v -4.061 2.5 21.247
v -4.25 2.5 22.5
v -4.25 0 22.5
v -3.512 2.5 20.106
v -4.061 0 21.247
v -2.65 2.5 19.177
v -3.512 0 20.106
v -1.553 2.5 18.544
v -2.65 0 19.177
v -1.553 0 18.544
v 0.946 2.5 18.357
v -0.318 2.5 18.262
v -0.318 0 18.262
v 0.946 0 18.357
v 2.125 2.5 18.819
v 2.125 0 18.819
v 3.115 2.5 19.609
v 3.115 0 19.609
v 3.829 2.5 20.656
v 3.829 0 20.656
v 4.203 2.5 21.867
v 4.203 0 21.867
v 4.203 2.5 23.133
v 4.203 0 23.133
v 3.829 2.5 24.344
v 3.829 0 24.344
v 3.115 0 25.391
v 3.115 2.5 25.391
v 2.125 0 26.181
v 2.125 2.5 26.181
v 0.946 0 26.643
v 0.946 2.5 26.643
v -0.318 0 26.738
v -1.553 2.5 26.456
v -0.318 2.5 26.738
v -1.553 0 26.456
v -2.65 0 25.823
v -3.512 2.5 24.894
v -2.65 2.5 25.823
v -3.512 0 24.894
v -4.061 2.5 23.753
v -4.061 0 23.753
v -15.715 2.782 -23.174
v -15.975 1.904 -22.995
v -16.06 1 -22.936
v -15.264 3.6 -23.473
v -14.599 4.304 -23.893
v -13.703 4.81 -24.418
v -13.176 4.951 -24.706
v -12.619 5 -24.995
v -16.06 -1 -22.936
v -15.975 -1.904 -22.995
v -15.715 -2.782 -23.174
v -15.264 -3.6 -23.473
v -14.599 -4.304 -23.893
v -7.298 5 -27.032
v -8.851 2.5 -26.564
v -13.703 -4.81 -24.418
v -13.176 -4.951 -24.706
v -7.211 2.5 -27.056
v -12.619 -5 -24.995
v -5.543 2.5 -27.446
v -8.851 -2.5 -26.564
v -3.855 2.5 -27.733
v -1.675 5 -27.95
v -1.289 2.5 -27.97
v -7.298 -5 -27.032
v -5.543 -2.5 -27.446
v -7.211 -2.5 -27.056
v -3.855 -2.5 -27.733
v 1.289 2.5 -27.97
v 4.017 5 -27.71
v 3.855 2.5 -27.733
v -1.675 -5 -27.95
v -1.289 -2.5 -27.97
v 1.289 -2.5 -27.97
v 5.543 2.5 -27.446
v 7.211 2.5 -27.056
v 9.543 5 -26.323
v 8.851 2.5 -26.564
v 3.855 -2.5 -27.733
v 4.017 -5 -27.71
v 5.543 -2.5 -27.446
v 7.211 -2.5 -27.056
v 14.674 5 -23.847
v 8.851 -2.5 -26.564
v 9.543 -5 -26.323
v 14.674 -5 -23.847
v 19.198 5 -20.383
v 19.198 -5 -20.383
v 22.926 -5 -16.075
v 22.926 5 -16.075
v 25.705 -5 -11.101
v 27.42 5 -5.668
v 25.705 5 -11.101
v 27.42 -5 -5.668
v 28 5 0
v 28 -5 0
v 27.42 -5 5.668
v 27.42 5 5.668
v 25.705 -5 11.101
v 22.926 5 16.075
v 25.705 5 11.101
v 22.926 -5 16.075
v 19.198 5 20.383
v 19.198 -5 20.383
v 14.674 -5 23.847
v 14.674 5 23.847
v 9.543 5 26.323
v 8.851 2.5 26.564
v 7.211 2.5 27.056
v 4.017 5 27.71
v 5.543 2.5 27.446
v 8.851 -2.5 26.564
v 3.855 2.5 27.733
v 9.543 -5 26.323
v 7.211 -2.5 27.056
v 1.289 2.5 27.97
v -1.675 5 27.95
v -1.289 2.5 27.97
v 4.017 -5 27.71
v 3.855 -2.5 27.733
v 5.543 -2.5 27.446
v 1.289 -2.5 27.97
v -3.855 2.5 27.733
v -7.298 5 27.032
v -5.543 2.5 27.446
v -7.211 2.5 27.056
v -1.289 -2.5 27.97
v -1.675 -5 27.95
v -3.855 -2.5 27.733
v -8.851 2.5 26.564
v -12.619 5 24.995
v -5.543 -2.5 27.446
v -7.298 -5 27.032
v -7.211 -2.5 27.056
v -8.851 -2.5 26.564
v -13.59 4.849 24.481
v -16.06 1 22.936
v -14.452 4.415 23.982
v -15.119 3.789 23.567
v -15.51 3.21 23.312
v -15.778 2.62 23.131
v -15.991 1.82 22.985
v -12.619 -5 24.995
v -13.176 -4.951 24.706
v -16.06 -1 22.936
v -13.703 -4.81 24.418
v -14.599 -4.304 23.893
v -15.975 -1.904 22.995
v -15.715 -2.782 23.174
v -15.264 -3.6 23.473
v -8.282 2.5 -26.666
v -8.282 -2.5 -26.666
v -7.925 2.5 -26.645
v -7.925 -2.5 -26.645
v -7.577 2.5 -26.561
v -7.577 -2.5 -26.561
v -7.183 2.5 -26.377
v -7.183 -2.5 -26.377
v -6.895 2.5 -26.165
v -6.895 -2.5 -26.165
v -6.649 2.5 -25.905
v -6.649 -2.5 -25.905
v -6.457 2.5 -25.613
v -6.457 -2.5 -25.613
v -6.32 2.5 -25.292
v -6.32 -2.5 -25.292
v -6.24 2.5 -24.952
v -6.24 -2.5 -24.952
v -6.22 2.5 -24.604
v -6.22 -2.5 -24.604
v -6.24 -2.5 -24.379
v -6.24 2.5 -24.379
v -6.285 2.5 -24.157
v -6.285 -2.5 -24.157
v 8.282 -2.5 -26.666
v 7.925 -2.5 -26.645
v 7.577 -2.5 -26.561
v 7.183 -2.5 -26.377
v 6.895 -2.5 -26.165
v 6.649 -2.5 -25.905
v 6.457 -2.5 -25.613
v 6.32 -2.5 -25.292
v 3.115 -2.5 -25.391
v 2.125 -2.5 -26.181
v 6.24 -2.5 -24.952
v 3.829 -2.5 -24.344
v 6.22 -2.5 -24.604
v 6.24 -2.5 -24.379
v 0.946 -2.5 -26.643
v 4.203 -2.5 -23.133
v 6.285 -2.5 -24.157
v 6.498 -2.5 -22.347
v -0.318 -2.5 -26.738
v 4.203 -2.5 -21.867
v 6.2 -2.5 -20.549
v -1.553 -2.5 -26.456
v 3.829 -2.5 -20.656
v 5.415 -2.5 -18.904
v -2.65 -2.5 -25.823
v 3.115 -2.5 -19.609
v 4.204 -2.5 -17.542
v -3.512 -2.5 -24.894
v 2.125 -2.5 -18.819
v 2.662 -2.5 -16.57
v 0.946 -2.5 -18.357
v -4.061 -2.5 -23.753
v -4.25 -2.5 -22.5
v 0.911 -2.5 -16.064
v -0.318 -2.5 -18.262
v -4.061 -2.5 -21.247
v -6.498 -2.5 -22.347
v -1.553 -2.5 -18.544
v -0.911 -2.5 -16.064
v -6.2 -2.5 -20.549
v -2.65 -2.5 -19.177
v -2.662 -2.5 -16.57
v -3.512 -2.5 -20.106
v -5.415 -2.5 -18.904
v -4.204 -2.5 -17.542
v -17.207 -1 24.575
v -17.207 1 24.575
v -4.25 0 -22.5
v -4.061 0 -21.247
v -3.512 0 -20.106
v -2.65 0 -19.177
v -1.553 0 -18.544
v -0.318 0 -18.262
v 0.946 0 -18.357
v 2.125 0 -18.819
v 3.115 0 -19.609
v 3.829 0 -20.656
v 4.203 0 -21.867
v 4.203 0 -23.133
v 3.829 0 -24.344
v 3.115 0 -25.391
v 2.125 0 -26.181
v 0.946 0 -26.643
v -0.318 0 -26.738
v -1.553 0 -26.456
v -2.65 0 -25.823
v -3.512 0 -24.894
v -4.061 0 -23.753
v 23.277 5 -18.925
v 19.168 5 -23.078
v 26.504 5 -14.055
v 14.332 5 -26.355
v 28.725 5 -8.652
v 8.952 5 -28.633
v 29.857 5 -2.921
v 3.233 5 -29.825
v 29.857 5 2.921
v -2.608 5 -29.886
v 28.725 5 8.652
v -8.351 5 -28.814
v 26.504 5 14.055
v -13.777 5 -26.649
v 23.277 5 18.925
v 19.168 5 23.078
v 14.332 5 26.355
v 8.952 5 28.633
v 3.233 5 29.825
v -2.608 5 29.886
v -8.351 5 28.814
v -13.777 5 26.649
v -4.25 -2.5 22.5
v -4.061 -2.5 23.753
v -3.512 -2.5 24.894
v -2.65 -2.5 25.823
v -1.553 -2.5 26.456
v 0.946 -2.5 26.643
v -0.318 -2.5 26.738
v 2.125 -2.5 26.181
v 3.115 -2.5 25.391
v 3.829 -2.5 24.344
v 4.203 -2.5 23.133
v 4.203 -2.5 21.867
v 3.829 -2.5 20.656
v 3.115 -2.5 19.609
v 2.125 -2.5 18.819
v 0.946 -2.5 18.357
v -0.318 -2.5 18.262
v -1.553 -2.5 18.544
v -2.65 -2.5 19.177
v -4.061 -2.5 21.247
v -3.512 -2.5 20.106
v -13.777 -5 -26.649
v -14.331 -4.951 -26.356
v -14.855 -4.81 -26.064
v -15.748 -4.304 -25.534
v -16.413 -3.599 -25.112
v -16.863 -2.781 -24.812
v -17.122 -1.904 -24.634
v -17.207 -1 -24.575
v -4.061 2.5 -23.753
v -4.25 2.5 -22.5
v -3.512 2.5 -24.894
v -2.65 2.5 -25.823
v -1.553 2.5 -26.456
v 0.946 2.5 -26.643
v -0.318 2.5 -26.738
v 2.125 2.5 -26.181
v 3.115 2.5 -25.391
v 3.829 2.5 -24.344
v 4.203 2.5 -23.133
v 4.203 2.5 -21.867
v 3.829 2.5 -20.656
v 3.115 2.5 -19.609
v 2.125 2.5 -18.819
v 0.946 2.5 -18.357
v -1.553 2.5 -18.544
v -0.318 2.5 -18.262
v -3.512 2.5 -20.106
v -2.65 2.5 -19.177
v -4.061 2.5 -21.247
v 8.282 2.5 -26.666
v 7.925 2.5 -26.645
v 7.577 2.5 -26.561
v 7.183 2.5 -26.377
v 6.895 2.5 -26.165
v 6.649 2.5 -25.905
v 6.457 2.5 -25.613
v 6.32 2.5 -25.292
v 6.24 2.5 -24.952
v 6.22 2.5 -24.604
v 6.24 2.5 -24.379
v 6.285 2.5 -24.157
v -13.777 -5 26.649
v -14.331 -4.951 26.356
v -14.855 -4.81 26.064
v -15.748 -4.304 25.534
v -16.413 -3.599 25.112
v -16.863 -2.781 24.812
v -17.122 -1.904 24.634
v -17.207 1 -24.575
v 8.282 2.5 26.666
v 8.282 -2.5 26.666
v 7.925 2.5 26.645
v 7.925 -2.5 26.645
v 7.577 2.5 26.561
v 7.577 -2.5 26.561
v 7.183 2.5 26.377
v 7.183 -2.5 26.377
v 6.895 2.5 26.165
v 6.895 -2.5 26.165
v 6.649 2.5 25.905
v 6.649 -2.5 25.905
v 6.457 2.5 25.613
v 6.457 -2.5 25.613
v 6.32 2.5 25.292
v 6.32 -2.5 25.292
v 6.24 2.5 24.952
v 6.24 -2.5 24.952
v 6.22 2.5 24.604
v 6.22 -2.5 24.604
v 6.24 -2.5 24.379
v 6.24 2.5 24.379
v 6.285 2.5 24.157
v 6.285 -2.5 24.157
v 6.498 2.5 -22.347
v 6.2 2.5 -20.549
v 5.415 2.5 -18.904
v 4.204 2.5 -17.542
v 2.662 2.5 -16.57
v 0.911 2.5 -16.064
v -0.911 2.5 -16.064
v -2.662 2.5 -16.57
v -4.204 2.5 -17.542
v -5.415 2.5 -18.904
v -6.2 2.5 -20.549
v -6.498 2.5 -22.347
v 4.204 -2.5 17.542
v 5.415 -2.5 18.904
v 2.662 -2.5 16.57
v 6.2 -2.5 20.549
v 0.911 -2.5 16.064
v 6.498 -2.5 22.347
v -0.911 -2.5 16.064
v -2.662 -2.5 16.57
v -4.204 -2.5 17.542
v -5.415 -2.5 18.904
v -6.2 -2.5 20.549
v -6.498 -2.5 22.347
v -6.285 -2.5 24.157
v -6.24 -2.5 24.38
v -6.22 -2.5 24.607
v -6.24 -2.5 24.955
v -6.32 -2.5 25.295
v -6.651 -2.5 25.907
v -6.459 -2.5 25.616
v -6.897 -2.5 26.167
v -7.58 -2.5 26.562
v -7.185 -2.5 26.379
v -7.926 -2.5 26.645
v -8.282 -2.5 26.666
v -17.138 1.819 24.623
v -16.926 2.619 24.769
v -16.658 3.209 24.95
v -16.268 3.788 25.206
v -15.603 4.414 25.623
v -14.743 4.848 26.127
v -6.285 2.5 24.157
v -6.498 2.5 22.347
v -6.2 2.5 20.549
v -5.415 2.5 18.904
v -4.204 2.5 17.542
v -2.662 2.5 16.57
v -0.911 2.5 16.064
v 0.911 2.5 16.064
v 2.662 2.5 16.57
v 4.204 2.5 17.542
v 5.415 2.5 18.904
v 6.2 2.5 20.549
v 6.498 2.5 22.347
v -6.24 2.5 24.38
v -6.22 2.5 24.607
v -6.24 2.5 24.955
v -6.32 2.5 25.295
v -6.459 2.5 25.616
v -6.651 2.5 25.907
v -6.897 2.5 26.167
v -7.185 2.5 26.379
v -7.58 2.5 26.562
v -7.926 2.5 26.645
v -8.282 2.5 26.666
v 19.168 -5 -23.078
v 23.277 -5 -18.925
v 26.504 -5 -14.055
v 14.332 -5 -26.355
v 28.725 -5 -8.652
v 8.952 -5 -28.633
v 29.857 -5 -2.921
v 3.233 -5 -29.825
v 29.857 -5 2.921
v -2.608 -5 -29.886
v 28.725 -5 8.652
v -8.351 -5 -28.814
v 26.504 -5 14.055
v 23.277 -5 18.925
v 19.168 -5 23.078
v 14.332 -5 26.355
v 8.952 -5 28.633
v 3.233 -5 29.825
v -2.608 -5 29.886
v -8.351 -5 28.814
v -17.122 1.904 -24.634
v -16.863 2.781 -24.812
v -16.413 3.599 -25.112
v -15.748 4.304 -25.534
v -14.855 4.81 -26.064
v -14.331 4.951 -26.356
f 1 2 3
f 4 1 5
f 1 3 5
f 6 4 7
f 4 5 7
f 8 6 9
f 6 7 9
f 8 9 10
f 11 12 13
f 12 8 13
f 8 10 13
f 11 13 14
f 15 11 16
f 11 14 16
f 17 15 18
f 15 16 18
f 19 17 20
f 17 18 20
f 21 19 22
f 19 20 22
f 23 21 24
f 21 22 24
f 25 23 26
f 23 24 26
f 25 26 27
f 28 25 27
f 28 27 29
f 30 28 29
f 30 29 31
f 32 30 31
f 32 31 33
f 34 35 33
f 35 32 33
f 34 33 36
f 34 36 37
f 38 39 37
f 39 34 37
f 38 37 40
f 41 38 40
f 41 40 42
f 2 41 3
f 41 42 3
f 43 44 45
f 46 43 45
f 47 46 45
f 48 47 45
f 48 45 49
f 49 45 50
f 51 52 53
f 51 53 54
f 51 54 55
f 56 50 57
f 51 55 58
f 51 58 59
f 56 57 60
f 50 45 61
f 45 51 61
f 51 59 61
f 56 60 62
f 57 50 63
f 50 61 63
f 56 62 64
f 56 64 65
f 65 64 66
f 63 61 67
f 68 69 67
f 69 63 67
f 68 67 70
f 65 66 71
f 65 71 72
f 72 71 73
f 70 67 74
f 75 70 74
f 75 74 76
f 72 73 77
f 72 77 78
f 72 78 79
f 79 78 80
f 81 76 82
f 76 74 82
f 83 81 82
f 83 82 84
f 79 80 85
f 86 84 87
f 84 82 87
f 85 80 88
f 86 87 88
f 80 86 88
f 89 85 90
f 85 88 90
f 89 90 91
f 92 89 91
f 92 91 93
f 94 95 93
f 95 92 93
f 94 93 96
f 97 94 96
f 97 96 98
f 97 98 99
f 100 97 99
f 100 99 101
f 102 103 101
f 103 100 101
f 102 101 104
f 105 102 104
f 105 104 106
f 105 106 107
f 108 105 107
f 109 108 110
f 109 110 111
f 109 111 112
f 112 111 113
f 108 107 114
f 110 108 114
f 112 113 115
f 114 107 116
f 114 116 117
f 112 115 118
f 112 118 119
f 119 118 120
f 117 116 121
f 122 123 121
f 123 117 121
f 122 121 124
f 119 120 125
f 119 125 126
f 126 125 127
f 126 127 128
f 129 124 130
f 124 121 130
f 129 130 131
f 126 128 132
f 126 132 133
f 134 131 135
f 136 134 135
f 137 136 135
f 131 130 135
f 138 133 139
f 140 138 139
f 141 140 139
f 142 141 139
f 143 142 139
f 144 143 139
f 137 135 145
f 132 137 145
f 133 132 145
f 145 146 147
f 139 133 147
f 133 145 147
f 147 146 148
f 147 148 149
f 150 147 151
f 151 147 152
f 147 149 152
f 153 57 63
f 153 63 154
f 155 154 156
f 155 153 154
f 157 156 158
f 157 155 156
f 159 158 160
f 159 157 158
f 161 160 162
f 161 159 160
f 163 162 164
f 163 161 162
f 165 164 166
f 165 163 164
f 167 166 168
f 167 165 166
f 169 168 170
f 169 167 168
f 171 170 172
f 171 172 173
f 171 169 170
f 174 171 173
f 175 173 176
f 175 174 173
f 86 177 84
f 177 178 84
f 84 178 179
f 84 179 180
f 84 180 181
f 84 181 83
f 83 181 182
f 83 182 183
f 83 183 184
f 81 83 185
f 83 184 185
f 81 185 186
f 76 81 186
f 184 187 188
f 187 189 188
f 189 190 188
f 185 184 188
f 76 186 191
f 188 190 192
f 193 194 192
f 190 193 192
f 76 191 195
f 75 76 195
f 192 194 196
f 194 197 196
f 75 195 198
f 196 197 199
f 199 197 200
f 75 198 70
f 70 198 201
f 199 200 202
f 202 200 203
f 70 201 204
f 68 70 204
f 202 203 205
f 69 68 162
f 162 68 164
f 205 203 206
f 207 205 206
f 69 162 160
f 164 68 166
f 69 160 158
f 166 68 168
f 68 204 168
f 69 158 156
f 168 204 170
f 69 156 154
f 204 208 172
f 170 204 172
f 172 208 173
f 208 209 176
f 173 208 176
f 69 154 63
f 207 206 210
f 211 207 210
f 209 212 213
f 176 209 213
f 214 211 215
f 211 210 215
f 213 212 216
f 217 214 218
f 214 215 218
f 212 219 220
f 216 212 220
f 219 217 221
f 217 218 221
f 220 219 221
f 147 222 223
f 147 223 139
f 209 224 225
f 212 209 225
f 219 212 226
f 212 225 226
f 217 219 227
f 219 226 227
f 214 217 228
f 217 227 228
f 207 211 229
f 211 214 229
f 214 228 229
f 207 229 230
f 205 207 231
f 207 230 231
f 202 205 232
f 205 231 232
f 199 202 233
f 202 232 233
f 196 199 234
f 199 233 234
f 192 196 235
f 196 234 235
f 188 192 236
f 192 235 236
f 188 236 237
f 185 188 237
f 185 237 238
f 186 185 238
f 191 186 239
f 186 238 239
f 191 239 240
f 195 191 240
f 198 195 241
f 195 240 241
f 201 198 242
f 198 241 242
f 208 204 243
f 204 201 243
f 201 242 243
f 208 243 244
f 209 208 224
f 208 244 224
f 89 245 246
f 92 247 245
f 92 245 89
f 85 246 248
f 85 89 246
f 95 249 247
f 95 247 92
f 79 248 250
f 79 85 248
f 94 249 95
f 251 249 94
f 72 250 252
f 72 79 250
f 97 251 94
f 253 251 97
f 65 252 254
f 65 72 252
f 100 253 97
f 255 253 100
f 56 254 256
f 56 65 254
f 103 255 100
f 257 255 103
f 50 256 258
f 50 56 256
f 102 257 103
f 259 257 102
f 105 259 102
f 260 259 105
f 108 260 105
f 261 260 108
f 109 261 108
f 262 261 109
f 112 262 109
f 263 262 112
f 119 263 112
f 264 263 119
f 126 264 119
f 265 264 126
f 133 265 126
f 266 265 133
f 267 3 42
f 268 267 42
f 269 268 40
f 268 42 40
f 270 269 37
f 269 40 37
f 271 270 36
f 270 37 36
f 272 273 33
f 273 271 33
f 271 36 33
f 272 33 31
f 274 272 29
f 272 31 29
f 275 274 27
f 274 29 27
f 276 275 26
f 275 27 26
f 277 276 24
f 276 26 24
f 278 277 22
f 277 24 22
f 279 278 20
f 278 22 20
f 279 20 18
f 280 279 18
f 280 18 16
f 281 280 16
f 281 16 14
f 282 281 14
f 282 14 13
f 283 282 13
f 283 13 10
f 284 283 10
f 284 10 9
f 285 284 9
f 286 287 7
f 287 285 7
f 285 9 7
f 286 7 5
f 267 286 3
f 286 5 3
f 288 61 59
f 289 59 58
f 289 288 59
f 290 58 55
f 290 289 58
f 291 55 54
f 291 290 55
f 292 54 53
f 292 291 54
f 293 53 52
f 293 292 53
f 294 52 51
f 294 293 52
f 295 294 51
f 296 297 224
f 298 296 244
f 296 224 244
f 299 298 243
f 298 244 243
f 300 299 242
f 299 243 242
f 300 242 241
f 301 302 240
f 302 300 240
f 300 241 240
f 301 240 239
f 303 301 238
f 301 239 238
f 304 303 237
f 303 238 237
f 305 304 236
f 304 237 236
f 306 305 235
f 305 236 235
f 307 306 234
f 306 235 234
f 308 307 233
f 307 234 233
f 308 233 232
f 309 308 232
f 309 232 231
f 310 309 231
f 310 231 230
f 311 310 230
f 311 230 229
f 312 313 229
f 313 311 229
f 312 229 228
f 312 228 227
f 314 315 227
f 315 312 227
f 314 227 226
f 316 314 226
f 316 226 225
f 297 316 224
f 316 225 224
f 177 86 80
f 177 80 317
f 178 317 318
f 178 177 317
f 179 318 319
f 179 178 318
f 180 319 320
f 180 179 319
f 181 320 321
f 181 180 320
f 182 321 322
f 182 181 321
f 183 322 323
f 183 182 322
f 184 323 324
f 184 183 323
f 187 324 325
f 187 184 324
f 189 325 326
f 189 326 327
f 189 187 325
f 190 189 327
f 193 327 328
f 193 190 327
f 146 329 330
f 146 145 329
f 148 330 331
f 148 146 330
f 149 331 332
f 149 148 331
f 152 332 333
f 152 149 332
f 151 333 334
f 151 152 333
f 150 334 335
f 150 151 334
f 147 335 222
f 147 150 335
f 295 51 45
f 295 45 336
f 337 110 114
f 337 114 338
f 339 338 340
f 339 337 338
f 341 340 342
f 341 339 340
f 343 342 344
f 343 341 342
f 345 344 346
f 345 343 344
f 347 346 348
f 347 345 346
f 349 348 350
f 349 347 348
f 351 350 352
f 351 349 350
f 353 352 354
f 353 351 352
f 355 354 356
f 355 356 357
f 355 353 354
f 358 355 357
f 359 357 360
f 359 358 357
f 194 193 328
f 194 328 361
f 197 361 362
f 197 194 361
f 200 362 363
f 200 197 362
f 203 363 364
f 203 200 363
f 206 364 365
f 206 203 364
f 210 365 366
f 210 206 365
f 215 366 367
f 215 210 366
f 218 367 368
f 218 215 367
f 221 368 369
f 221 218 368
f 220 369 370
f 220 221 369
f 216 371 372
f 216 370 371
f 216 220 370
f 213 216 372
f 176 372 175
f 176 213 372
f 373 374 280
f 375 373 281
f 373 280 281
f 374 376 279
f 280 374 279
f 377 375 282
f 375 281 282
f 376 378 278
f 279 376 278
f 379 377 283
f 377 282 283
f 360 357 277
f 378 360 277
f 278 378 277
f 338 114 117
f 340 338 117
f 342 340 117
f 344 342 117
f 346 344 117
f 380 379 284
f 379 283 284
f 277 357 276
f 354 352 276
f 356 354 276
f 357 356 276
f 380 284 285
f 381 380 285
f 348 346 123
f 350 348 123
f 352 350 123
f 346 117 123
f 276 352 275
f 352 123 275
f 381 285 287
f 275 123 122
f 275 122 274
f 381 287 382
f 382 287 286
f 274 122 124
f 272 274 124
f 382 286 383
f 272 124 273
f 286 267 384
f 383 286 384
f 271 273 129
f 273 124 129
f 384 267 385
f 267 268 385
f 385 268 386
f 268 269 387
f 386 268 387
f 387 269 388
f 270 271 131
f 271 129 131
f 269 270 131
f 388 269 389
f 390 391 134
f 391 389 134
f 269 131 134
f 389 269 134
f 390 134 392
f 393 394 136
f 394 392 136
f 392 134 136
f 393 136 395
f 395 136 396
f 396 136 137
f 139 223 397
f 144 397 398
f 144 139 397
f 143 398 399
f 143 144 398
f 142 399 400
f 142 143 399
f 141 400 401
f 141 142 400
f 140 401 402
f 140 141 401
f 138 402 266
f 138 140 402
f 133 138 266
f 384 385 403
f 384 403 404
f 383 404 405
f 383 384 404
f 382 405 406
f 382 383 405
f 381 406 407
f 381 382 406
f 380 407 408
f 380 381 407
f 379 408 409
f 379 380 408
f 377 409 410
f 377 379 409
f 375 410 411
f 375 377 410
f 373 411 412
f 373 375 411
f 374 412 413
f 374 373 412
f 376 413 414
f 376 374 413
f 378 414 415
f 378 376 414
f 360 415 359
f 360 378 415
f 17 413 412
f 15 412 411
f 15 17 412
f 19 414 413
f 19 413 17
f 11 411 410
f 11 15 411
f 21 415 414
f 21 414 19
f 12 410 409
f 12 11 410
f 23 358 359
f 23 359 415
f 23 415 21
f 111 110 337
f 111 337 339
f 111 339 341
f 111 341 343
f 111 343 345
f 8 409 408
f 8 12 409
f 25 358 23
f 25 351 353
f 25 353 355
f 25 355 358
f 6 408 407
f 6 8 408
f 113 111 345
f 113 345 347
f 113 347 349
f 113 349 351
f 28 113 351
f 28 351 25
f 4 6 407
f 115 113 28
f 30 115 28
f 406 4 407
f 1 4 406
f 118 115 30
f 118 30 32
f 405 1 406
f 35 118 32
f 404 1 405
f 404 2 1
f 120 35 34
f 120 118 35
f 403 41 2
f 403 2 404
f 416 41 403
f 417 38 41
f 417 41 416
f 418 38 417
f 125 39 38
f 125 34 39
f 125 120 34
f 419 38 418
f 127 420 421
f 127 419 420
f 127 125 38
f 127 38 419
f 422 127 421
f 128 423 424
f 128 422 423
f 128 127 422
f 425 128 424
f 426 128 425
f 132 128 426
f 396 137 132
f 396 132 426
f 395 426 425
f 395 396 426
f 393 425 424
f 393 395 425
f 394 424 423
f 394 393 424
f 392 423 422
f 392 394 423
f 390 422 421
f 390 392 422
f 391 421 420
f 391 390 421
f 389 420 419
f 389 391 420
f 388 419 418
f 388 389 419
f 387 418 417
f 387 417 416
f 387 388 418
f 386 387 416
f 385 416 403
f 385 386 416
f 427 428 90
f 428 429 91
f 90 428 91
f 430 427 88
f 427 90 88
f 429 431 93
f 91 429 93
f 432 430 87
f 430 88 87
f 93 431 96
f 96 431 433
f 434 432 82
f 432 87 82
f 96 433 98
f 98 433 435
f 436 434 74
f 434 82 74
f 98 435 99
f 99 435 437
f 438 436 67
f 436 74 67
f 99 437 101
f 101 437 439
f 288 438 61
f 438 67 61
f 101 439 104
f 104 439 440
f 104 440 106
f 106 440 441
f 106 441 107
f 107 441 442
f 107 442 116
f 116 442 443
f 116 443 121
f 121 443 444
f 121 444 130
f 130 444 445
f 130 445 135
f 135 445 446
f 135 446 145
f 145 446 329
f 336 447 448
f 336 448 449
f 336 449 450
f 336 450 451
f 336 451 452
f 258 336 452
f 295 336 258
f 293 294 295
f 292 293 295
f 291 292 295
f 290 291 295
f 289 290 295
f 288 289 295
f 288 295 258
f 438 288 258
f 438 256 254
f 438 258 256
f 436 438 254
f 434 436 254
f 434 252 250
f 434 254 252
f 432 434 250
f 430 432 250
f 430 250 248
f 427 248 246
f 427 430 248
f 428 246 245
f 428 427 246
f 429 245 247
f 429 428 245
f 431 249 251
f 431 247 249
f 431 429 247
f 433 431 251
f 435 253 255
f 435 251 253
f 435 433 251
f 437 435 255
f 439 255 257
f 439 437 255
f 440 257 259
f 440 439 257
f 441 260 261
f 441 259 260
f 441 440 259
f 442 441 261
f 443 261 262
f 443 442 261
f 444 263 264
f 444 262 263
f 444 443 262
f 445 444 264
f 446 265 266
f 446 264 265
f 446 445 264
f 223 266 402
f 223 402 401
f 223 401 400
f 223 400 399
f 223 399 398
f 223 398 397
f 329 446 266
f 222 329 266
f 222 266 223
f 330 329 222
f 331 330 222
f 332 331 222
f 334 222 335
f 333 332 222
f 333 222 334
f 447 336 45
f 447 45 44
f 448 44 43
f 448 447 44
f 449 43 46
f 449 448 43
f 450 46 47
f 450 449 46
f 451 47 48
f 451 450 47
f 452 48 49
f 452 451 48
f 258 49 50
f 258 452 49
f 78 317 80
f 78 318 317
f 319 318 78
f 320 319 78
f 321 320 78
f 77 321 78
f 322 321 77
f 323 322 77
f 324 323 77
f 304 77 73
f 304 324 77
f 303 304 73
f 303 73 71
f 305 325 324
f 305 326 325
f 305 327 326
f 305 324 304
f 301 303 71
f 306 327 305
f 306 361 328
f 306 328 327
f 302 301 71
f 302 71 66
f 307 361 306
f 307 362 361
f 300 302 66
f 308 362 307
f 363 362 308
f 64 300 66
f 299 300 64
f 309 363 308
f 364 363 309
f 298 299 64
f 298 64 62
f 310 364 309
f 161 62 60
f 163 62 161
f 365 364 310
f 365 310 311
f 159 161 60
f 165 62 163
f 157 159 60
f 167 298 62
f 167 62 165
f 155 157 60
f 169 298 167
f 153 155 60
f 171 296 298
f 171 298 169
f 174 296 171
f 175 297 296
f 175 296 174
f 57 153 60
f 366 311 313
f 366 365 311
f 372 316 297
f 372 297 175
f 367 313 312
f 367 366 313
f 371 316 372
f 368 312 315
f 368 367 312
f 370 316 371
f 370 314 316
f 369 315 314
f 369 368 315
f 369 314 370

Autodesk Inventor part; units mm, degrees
ref_plane "YZ Plane" through (0, 0, 0) normal (1, 0, 0) x (0, 1, 0)
ref_plane "XZ Plane" through (0, 0, 0) normal (0, 1, 0) x (-1, 0, 0)
ref_plane "XY Plane" through (0, 0, 0) normal (0, 0, 1) x (1, 0, 0)
sketch "Skizze1" plane through (0, 0, 0) normal (0, 1, 0) x (-1, 0, 0)
  circle A0 centre (0, 0) radius 28
  circle A1 centre (0, 0) radius 30
  dimension "d0" = 56
  dimension "d1" = 60
extrude "Extrusion1" add sketch "Skizze1" along normal mid plane 10
sketch "Skizze2" plane through (0, 0, 0) normal (0, 1, 0) x (-1, 0, 0)
  circle A0 centre (0, 22.5) radius 4.25
  circle A1 centre (0, -22.5) radius 4.25
  line L0 (44.9262, 0) -> (-43.1306, 0) construction
  circle A2 centre (0, -22.5) radius 6.5
  circle A3 centre (0, 22.5) radius 6.5
  line L1 (0, 38.6377) -> (0, -60.2779) construction
  line L2 (3, 29.5) -> (-3, 29.5)
  line L3 (-3, 29.5) -> (-3, -29.5)
  line L4 (-3, -29.5) -> (3, -29.5)
  line L5 (3, -29.5) -> (3, 29.5)
  point P0 (0, 0)
  point P1 (-3, 28.2663)
  point P2 (3, 28.2663)
  point P3 (-3, -28.2663)
  point P4 (3, -28.2663)
  dimension "d4" = 45
  dimension "d5" = 8.5
  dimension "d6" = 8.5
  dimension "d7" = 13
  dimension "d8" = 13
  dimension "d9" = 6
  dimension "d21" = 59
extrude "Extrusion2" add sketch "Skizze2" along normal mid plane 5 contours A0 L5 A3 | A0 L3 A3 L5 | L5 A3 L3 A0 | A0 L3 A3 | A3 L3 L2 L5 | L5 A1 L3 A2 | A2 L5 A1 | L3 A1 A2 | L3 A1 L5 A2 | A2 L5 L4 L3
sketch "Skizze3" plane through (0, 0, 0) normal (0, 1, 0) x (-1, 0, 0)
  line L0 (-37.328, 53.3099) -> (47.5678, -67.9338) construction
  line L1 (48.5469, 69.3321) -> (-29.5635, -42.2211) construction
  line L2 (0, 56.0595) -> (0, -79.5026) construction
  circle A0 centre (0, 0) radius 30
  circle A1 centre (0, 0) radius 28
  line L3 (19.8236, 28.311) -> (13.732, 19.6114)
  line L4 (14.4871, -20.6897) -> (22.3283, -31.8882)
  point P0 (16.0601, -22.9363)
  point P1 (17.2073, -24.5746)
  point P2 (17.2073, 24.5746)
  point P3 (16.0601, 22.9363)
  dimension "d12" = 110
  dimension "d13" = 35
  dimension "d19" = 56
  dimension "d20" = 60
extrude "Extrusion3" cut sketch "Skizze3" along normal mid plane 10 contours A0 L4 A1 L3 picked at (29.0468, 2.3769)
fillet "Rundung1" radius 4 4 edges at (-16.6337, -5, -23.7554) (-16.6337, 5, -23.7554) (-16.6337, 5, 23.7554) (-16.6337, -5, 23.7554)
fillet "Rundung2" radius 2 4 edges at (3.8552, 0, -27.7333) (-3.8552, 0, -27.7333) (-3.8552, 0, 27.7333) (3.8552, 0, 27.7333)
properties part number "_3D-Druck"
